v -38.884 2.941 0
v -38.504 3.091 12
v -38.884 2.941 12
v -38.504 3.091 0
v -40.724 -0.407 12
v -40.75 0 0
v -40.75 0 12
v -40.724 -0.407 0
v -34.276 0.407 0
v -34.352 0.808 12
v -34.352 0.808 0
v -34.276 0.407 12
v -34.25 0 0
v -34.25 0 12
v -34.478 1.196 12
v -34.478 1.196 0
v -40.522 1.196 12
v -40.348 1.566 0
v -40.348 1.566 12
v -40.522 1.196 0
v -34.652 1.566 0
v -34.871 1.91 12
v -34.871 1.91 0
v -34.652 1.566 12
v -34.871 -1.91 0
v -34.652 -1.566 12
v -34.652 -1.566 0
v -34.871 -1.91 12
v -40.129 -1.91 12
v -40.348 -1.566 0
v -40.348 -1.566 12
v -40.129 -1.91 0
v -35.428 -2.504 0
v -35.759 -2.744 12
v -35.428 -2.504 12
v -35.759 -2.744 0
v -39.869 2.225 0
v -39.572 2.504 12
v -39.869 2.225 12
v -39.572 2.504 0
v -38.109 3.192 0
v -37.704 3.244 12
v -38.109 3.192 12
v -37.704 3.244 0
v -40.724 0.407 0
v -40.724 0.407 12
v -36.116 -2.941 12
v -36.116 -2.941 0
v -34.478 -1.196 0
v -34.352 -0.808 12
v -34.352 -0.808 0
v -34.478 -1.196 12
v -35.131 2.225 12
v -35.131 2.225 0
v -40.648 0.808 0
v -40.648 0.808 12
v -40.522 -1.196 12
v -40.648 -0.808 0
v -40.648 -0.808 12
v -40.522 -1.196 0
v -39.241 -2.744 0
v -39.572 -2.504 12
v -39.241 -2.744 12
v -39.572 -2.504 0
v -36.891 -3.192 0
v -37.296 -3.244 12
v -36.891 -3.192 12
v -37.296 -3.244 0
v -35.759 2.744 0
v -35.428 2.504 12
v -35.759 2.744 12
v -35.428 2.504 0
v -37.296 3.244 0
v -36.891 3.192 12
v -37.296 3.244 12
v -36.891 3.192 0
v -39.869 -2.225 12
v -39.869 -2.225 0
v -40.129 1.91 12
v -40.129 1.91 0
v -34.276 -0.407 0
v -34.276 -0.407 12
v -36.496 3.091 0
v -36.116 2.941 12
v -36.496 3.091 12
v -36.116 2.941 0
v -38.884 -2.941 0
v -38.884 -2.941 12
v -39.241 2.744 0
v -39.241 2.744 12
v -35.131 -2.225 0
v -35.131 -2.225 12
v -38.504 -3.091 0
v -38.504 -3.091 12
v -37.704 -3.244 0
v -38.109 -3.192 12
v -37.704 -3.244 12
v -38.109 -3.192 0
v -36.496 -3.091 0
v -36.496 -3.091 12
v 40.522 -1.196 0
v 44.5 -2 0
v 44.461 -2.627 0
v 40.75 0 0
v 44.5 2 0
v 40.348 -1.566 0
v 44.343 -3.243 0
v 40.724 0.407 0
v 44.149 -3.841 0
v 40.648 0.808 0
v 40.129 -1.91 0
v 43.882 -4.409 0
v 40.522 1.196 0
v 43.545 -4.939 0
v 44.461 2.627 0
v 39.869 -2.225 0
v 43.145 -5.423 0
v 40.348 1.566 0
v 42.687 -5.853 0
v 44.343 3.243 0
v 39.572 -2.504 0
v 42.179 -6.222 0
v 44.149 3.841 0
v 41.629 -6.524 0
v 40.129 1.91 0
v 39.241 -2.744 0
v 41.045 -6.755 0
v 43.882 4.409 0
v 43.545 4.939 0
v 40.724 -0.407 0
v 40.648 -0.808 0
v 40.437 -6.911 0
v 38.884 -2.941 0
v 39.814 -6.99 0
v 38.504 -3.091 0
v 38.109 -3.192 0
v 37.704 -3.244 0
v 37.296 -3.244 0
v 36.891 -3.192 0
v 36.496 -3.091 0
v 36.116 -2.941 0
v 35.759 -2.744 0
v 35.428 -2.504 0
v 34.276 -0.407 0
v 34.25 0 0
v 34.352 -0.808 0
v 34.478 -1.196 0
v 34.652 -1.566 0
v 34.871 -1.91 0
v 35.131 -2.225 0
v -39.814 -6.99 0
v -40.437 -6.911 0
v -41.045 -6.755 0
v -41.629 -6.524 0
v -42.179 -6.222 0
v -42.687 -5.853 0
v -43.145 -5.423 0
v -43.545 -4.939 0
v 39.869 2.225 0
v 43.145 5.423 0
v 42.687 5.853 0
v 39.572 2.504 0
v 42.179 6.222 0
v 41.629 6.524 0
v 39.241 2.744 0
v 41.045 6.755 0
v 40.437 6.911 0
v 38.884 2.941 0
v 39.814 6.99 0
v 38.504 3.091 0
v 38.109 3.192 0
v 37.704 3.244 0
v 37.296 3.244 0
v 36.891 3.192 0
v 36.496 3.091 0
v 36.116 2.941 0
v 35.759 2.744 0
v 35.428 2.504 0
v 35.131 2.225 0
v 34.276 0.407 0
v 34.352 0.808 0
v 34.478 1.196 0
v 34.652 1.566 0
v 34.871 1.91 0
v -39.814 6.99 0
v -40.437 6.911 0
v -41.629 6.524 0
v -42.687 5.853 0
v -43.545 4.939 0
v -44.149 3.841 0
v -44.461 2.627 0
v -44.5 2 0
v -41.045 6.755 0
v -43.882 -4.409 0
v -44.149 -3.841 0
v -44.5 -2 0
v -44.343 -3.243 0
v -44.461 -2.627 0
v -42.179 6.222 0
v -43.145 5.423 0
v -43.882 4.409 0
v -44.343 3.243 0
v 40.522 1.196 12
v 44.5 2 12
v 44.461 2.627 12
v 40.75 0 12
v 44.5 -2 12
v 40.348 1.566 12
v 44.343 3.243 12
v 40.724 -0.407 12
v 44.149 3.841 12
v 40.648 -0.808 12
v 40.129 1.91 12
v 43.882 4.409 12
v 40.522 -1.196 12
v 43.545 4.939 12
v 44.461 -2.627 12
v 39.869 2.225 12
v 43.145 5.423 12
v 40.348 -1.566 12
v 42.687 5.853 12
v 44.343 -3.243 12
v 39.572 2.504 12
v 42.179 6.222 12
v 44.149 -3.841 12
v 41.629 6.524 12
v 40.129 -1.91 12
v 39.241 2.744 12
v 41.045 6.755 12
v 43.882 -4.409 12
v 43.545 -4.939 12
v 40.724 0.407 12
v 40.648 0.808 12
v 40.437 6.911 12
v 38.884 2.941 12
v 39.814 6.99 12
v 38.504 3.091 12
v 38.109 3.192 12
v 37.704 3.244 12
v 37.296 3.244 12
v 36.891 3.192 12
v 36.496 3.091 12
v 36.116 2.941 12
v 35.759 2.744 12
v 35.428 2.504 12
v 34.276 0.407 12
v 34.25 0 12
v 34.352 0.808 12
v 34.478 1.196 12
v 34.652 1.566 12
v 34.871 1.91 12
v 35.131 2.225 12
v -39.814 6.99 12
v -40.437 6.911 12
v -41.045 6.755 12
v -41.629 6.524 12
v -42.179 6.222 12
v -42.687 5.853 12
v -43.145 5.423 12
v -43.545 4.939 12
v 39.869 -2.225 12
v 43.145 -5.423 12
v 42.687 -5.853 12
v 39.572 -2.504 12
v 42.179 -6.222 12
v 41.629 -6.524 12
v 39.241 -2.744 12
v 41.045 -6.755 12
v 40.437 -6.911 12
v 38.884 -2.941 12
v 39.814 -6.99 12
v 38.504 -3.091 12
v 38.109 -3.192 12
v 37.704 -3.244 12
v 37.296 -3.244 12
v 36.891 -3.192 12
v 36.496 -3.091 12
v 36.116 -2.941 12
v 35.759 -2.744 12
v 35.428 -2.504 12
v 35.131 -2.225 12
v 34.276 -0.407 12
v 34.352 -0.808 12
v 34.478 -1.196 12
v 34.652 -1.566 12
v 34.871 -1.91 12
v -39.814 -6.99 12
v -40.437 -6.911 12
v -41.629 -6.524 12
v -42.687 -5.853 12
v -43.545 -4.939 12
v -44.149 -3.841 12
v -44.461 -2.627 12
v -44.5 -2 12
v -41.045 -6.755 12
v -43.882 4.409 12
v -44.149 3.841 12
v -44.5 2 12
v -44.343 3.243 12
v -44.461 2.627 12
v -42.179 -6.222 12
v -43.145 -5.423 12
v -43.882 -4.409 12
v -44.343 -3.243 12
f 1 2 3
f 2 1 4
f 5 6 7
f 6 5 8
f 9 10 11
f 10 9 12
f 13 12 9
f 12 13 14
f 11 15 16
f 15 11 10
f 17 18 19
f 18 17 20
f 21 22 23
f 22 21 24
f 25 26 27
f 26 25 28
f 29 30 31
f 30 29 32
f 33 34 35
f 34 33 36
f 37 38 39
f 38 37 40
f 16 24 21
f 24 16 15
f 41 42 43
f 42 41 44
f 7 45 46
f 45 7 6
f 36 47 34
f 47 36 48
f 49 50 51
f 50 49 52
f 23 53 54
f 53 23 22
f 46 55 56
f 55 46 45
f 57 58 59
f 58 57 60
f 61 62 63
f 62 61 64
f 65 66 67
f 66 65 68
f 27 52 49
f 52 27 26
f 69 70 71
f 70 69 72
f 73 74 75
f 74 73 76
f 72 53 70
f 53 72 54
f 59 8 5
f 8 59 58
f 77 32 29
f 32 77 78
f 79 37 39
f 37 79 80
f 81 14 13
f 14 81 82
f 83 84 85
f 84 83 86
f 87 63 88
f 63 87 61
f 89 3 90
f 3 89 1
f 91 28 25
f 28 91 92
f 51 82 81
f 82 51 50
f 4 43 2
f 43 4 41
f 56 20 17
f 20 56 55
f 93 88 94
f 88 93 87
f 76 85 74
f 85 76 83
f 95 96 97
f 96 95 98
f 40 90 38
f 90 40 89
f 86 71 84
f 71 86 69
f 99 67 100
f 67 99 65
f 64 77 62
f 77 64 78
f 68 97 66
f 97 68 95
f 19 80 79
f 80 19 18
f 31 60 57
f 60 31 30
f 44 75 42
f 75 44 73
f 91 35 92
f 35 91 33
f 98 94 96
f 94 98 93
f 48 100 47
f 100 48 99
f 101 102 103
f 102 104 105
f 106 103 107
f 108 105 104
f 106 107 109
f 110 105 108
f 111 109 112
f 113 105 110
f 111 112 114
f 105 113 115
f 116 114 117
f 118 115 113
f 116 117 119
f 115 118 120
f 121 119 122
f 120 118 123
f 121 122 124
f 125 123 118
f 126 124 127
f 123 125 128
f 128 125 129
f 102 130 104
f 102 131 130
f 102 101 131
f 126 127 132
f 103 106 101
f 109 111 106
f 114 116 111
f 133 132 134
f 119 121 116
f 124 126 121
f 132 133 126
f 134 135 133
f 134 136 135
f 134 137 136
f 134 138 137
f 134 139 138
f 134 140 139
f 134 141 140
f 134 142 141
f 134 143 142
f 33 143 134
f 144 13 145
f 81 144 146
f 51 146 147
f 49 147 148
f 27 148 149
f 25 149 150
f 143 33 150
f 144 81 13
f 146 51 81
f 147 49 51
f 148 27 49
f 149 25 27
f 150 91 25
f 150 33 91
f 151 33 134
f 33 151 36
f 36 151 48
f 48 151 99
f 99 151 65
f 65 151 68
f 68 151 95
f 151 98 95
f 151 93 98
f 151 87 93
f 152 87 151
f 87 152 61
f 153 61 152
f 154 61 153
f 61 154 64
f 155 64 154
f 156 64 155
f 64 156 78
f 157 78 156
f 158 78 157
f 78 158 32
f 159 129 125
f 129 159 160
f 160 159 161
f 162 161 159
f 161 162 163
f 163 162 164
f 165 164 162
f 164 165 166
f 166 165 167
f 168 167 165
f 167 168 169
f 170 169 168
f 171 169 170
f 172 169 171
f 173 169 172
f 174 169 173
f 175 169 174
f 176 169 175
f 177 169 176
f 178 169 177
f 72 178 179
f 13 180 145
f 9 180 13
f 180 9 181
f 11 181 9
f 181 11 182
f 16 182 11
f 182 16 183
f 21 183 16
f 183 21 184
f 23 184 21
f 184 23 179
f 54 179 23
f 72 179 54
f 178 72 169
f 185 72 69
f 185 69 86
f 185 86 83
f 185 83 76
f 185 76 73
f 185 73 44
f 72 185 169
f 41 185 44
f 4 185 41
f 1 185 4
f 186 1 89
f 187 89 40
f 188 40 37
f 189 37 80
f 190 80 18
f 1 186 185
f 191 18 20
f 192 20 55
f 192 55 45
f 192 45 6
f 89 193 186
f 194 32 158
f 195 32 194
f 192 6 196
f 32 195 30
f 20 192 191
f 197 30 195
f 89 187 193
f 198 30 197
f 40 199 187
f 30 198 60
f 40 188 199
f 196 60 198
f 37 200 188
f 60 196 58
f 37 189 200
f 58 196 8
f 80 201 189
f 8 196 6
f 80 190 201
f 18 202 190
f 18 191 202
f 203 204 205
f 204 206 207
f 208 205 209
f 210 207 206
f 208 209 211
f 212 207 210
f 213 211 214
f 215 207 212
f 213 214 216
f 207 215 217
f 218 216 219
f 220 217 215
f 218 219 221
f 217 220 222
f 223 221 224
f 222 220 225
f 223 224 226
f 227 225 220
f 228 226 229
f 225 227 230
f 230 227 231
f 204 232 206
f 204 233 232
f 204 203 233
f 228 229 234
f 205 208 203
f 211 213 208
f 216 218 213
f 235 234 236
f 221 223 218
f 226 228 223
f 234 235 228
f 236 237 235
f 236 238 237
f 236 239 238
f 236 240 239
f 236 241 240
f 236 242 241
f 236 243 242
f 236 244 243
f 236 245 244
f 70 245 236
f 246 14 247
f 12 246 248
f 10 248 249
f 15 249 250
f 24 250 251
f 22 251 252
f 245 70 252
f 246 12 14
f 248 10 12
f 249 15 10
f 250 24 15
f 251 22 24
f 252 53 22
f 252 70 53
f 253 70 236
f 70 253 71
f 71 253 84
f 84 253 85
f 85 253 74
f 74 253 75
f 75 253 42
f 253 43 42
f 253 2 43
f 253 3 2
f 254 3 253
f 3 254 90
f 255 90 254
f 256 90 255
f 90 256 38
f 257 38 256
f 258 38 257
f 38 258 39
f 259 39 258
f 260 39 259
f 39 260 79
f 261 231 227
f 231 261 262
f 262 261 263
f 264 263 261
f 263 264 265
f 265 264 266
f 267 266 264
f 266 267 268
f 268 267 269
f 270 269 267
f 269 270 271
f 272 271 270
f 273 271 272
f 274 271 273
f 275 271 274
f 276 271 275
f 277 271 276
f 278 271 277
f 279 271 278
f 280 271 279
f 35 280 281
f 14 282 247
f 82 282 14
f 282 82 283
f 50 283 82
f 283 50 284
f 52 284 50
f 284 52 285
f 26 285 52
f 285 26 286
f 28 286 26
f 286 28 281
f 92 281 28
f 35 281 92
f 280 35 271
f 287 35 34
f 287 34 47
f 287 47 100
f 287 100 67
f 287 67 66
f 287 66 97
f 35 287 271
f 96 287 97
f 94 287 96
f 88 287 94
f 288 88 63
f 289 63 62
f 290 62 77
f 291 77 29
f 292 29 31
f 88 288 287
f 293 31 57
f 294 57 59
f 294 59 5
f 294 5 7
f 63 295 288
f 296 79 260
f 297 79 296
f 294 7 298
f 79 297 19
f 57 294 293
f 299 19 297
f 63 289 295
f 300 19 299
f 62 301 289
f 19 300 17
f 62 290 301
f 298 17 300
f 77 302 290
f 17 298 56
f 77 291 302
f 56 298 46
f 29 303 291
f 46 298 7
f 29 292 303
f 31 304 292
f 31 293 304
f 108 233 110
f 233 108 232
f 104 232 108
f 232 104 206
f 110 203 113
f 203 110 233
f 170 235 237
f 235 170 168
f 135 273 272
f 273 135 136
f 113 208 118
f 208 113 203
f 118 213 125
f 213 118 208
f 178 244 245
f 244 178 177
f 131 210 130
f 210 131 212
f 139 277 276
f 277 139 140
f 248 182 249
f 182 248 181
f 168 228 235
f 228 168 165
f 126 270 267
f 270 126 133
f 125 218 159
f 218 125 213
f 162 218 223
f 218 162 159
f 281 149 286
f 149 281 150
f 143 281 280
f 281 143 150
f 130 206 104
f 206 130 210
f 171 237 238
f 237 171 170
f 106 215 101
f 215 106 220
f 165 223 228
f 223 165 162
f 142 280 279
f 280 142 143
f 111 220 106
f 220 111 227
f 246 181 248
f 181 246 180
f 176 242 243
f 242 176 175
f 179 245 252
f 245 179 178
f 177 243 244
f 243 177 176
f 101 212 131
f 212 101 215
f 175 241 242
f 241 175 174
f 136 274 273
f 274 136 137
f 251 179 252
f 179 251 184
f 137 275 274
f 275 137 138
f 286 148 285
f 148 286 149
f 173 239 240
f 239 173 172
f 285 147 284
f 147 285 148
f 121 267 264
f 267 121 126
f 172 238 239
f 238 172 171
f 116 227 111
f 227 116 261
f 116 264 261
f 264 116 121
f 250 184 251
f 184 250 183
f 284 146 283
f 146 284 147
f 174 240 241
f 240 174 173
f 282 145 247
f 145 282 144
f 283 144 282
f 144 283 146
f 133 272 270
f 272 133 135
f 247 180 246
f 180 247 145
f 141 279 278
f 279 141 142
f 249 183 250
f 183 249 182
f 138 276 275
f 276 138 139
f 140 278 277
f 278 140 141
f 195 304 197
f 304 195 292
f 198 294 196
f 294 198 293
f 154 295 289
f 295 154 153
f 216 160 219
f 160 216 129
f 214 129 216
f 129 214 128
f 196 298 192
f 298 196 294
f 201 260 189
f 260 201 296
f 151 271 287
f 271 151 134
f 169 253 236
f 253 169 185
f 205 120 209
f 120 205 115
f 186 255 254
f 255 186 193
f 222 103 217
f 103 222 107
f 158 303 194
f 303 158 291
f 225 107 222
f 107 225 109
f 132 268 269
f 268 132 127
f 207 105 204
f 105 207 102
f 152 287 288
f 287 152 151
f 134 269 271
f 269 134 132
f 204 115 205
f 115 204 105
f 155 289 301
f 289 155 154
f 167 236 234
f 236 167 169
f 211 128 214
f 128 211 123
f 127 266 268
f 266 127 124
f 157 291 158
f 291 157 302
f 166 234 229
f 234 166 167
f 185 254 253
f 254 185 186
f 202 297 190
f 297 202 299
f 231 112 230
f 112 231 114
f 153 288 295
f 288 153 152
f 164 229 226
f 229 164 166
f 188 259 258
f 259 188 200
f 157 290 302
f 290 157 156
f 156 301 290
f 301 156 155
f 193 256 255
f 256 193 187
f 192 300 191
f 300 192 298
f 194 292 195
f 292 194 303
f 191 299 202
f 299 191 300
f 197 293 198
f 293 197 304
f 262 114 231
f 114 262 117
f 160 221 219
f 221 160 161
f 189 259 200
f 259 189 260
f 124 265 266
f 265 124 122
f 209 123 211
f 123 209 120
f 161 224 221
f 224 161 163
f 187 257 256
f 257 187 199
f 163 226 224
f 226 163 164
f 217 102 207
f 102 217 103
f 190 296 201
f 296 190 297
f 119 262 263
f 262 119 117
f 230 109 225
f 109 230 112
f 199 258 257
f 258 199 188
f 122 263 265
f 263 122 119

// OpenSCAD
$fn = 50;


difference() {
	union() {
		hull() {
			translate(v = [-39.5000000000, 2.0000000000, 0]) {
				cylinder(h = 12, r = 5);
			}
			translate(v = [39.5000000000, 2.0000000000, 0]) {
				cylinder(h = 12, r = 5);
			}
			translate(v = [-39.5000000000, -2.0000000000, 0]) {
				cylinder(h = 12, r = 5);
			}
			translate(v = [39.5000000000, -2.0000000000, 0]) {
				cylinder(h = 12, r = 5);
			}
		}
	}
	union() {
		translate(v = [-37.5000000000, 0.0000000000, 0]) {
			cylinder(h = 12, r = 3.2500000000);
		}
		translate(v = [37.5000000000, 0.0000000000, 0]) {
			cylinder(h = 12, r = 3.2500000000);
		}
		translate(v = [-37.5000000000, 0.0000000000, 0]) {
			cylinder(h = 12, r = 1.8000000000);
		}
		translate(v = [37.5000000000, 0.0000000000, 0]) {
			cylinder(h = 12, r = 1.8000000000);
		}
		translate(v = [-37.5000000000, 0.0000000000, 0]) {
			cylinder(h = 12, r = 1.8000000000);
		}
		translate(v = [37.5000000000, 0.0000000000, 0]) {
			cylinder(h = 12, r = 1.8000000000);
		}
		translate(v = [-37.5000000000, 0.0000000000, 0]) {
			cylinder(h = 12, r = 1.8000000000);
		}
		translate(v = [37.5000000000, 0.0000000000, 0]) {
			cylinder(h = 12, r = 1.8000000000);
		}
	}
}
